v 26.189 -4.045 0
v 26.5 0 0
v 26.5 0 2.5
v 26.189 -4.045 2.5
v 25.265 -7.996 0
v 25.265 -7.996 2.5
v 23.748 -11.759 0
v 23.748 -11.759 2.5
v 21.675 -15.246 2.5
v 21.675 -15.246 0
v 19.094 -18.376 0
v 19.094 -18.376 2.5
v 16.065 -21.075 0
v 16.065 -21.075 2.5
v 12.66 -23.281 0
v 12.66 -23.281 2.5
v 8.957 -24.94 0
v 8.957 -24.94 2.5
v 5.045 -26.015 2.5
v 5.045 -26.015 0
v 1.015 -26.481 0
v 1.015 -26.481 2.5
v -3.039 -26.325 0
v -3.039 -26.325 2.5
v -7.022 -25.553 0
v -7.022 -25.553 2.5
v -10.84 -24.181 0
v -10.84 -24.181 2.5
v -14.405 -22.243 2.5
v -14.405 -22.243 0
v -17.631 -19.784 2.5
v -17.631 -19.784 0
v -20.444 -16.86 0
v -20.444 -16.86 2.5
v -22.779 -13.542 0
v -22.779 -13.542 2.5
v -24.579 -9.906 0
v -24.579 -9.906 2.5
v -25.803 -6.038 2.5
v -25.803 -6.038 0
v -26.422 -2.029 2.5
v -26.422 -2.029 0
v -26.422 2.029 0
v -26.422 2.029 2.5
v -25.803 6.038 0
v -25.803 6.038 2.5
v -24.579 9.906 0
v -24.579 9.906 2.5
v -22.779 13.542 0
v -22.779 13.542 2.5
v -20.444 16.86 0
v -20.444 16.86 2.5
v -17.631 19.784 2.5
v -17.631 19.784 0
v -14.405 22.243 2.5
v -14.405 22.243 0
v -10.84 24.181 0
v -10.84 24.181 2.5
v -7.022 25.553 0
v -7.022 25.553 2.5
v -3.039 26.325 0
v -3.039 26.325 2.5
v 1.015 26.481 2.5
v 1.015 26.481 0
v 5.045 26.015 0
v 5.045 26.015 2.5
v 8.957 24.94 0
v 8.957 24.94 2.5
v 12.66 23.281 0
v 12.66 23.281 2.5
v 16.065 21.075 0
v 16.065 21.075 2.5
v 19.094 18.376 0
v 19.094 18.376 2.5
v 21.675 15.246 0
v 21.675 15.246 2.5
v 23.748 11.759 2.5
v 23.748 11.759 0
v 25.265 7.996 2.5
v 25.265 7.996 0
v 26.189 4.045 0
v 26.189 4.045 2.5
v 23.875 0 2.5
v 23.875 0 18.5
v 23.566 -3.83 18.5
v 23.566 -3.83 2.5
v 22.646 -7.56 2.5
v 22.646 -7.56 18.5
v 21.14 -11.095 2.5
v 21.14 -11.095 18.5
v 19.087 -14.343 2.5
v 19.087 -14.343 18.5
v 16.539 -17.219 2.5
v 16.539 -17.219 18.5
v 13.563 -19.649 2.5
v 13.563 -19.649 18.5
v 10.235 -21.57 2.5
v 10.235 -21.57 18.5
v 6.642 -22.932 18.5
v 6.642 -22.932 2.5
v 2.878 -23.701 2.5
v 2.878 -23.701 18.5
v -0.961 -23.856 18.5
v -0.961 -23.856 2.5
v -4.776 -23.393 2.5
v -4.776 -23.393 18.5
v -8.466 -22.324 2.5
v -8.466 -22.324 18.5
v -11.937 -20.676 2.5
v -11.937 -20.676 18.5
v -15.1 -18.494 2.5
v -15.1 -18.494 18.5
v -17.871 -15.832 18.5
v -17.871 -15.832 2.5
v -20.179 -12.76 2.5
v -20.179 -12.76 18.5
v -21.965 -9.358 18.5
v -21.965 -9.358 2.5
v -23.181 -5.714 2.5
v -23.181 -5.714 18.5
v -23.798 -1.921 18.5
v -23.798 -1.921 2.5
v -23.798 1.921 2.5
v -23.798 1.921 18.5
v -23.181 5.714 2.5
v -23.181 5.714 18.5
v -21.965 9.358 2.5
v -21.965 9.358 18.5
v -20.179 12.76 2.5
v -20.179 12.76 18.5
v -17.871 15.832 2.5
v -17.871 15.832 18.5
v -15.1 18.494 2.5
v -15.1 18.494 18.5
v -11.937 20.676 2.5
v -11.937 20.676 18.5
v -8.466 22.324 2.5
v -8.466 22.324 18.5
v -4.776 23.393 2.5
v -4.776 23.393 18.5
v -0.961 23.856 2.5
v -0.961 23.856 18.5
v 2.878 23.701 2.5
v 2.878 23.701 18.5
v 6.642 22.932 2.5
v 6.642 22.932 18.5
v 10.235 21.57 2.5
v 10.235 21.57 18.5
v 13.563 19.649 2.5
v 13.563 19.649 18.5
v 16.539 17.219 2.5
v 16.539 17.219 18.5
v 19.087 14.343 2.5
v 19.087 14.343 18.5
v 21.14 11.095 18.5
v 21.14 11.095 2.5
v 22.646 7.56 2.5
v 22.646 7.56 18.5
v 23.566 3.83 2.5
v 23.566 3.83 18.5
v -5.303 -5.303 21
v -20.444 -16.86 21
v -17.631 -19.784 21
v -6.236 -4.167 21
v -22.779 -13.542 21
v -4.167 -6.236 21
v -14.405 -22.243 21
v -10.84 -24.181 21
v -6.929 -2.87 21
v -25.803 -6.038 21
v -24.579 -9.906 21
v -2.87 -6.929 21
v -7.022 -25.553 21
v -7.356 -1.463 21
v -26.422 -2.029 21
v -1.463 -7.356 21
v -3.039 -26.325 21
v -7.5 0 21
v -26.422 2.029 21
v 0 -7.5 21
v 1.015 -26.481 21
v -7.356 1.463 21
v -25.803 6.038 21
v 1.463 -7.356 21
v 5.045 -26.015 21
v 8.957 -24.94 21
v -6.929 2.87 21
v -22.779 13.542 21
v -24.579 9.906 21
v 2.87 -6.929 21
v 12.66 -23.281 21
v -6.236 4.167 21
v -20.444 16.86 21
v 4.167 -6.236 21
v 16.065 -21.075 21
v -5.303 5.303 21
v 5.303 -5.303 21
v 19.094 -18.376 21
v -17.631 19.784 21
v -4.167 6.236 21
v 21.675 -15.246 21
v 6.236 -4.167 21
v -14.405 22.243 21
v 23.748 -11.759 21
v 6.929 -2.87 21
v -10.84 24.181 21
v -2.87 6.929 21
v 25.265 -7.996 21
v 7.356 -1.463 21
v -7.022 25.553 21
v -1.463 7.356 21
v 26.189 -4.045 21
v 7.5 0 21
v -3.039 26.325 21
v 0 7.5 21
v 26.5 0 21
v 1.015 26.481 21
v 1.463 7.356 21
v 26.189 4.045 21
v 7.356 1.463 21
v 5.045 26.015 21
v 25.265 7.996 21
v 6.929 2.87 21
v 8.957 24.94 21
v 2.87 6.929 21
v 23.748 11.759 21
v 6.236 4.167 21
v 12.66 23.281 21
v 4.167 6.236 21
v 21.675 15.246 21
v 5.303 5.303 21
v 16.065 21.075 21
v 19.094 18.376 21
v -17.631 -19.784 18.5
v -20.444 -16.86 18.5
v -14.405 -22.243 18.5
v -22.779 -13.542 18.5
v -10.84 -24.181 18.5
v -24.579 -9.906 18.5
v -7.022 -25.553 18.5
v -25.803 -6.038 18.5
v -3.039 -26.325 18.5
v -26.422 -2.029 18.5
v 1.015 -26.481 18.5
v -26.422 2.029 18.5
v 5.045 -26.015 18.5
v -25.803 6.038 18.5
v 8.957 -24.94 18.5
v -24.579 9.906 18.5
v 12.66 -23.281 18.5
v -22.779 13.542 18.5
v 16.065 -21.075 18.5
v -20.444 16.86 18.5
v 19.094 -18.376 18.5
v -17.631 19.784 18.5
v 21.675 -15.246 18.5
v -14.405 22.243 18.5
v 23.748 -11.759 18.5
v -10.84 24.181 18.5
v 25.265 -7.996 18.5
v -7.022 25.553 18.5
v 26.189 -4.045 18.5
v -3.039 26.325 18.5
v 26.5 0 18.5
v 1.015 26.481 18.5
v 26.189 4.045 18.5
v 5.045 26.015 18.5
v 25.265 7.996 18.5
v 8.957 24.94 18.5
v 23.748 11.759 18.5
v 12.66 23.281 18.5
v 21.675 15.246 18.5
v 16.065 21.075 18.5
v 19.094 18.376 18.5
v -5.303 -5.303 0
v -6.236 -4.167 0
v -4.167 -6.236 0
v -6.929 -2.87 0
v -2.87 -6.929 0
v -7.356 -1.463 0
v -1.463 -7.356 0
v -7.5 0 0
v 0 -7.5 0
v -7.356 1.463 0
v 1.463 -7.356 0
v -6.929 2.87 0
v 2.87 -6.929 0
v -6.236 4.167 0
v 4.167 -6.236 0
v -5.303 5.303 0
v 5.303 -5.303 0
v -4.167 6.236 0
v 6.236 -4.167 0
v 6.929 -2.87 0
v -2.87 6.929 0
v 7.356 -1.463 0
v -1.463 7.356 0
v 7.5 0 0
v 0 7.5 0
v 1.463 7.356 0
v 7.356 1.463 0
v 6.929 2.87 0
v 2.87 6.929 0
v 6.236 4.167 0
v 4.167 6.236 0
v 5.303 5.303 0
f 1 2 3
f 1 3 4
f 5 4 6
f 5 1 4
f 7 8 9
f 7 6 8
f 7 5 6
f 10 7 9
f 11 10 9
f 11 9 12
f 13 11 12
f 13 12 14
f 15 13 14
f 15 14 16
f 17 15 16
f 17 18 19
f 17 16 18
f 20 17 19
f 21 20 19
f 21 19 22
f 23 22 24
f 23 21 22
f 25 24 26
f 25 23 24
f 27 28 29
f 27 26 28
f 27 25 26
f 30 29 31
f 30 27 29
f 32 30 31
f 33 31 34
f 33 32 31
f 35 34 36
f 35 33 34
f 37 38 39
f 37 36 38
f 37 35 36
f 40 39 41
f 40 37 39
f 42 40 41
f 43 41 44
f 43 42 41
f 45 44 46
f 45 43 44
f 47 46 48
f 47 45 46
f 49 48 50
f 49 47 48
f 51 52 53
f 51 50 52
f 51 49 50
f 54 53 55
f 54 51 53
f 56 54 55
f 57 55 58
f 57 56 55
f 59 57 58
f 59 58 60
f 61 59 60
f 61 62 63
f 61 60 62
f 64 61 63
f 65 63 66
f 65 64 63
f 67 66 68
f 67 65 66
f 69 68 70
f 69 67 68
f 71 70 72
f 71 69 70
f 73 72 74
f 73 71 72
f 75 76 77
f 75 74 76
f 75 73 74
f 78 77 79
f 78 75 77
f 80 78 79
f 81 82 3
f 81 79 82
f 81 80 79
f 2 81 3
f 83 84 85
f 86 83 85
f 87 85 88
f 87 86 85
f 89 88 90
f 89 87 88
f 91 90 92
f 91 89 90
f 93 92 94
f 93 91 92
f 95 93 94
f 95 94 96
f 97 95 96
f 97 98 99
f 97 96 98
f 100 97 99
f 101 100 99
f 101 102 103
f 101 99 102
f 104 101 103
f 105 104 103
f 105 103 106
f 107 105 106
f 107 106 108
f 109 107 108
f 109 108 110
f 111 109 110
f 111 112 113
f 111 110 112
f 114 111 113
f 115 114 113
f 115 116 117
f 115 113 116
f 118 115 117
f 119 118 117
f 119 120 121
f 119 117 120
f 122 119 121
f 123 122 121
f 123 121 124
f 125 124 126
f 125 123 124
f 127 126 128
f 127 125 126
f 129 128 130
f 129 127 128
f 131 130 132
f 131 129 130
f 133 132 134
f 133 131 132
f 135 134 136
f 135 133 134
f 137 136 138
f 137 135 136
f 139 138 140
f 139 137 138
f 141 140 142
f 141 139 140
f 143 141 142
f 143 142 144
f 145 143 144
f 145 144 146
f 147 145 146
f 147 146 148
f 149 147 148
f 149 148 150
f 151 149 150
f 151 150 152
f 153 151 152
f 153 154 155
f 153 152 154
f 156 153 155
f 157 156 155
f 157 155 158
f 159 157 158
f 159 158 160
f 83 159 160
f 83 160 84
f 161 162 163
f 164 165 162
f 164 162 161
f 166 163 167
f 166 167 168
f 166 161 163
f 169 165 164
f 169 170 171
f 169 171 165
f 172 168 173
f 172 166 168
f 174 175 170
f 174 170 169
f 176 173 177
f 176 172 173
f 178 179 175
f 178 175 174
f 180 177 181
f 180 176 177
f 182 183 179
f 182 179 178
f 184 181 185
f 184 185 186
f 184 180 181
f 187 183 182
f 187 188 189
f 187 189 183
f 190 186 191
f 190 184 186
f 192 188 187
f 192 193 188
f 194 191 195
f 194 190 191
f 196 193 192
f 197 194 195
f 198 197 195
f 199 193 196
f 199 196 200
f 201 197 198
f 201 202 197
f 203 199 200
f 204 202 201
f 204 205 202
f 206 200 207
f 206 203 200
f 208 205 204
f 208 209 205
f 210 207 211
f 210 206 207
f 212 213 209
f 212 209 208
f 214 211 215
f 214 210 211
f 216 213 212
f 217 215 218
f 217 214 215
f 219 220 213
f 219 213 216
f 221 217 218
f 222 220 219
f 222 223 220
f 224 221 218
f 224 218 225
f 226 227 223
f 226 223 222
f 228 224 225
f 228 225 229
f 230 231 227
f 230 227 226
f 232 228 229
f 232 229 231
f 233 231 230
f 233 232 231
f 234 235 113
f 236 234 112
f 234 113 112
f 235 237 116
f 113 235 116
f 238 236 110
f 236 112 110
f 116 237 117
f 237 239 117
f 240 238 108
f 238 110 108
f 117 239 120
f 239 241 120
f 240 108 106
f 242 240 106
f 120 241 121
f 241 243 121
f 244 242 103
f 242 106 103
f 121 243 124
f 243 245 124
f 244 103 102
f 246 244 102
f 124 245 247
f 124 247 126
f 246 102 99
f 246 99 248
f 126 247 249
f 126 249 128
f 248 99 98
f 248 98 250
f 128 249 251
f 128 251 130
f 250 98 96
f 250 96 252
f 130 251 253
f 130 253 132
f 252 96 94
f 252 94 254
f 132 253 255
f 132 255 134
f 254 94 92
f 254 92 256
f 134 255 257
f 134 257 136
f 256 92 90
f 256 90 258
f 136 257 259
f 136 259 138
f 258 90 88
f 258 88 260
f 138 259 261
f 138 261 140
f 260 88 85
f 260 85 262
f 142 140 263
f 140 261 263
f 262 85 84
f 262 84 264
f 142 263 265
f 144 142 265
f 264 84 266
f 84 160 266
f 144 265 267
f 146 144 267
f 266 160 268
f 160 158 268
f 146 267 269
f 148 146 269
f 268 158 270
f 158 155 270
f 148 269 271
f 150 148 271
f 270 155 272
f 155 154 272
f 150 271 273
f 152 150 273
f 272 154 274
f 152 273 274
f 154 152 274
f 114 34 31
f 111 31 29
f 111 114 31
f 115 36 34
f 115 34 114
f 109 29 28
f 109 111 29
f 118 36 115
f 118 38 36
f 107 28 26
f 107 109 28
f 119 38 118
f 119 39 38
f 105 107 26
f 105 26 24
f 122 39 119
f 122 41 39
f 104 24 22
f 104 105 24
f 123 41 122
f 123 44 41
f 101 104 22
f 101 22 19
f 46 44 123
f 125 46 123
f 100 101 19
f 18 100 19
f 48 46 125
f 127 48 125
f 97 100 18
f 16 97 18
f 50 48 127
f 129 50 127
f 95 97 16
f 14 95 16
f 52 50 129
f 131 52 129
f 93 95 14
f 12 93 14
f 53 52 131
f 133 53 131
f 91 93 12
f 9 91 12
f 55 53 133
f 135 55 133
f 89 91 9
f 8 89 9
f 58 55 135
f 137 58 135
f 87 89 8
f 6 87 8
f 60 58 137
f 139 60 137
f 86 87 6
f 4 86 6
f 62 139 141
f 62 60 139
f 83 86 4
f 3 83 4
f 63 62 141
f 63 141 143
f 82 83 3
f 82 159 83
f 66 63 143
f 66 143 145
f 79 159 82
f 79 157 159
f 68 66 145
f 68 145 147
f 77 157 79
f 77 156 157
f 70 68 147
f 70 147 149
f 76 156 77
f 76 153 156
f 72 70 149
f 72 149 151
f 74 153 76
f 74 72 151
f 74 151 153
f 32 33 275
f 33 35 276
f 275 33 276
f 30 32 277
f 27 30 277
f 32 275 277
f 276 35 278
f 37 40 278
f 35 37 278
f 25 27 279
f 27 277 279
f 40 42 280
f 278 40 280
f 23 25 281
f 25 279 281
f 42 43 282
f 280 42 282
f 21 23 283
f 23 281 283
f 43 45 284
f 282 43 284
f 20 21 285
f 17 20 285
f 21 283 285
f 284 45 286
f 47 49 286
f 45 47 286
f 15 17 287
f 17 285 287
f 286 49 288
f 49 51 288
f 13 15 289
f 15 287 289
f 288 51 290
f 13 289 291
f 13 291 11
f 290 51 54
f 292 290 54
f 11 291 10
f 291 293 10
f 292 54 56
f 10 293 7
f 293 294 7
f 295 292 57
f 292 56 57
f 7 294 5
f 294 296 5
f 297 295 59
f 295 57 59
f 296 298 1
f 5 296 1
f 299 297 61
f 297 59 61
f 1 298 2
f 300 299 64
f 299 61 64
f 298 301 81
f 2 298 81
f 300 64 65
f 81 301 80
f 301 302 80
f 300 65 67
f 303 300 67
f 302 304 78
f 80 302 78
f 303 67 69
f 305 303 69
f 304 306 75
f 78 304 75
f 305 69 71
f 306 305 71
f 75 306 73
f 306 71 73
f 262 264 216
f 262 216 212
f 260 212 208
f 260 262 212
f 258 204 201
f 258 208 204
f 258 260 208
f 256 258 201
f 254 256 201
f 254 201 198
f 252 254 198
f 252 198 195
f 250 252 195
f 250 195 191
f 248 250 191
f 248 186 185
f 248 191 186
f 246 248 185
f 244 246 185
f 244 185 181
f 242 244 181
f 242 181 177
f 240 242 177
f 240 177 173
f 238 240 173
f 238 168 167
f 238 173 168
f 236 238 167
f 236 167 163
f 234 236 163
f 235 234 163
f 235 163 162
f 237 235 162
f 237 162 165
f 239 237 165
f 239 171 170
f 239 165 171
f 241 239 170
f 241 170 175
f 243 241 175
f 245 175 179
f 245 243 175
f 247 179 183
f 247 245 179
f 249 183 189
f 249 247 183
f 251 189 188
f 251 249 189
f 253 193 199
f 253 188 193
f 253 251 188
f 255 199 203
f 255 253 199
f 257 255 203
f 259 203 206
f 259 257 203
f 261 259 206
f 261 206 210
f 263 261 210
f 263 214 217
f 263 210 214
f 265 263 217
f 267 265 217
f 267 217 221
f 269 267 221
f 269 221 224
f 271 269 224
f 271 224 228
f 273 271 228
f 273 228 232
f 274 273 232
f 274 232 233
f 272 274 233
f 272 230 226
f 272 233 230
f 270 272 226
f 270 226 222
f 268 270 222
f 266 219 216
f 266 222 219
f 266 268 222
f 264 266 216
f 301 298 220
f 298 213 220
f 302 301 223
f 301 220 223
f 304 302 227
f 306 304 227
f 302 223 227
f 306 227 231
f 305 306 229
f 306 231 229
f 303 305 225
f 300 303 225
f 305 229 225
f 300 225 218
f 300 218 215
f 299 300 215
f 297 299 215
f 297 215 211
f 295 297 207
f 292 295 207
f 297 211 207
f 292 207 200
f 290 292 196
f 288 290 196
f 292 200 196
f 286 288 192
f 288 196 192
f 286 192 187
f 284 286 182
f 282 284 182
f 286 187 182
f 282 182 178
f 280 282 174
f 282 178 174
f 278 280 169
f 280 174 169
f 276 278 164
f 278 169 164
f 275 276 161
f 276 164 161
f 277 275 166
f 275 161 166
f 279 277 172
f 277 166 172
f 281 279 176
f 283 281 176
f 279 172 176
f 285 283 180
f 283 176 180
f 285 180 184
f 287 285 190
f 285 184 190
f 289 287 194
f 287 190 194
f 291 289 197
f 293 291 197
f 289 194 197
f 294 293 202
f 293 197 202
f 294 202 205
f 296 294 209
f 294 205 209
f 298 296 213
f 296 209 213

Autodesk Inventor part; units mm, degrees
ref_plane "YZ Plane" through (0, 0, 0) normal (1, 0, 0) x (0, 1, 0)
ref_plane "XZ Plane" through (0, 0, 0) normal (0, 1, 0) x (-1, 0, 0)
ref_plane "XY Plane" through (0, 0, 0) normal (0, 0, 1) x (1, 0, 0)
sketch "Sketch1" plane through (0, 0, 0) normal (0, 0, 1) x (1, 0, 0)
  circle A0 centre (0, 0) radius 26.5
  dimension "d0" = 53
extrude "Extrusion1" add sketch "Sketch1" along normal blind 2.5
sketch "Sketch2" plane through (0, 0, 2.5) normal (0, 0, 1) x (1, 0, 0)
  circle A0 centre (0, 0) radius 23.875
  dimension "d3" = 47.75
extrude "Extrusion2" add sketch "Sketch2" along normal blind 16
sketch "Sketch3" plane through (0, 0, 18.5) normal (0, 0, 1) x (1, 0, 0)
  circle A0 centre (0, 0) radius 26.5
  dimension "d6" = 53
extrude "Extrusion3" add sketch "Sketch3" along normal blind 2.5
sketch "Sketch4" plane through (0, 0, 21) normal (0, 0, 1) x (1, 0, 0)
  circle A0 centre (0, 0) radius 7.5
  dimension "d9" = 15
extrude "Extrusion4" cut sketch "Sketch4" against normal blind 30
properties part number "HTD5M 30 Pulley" material "Aluminum 6061"
